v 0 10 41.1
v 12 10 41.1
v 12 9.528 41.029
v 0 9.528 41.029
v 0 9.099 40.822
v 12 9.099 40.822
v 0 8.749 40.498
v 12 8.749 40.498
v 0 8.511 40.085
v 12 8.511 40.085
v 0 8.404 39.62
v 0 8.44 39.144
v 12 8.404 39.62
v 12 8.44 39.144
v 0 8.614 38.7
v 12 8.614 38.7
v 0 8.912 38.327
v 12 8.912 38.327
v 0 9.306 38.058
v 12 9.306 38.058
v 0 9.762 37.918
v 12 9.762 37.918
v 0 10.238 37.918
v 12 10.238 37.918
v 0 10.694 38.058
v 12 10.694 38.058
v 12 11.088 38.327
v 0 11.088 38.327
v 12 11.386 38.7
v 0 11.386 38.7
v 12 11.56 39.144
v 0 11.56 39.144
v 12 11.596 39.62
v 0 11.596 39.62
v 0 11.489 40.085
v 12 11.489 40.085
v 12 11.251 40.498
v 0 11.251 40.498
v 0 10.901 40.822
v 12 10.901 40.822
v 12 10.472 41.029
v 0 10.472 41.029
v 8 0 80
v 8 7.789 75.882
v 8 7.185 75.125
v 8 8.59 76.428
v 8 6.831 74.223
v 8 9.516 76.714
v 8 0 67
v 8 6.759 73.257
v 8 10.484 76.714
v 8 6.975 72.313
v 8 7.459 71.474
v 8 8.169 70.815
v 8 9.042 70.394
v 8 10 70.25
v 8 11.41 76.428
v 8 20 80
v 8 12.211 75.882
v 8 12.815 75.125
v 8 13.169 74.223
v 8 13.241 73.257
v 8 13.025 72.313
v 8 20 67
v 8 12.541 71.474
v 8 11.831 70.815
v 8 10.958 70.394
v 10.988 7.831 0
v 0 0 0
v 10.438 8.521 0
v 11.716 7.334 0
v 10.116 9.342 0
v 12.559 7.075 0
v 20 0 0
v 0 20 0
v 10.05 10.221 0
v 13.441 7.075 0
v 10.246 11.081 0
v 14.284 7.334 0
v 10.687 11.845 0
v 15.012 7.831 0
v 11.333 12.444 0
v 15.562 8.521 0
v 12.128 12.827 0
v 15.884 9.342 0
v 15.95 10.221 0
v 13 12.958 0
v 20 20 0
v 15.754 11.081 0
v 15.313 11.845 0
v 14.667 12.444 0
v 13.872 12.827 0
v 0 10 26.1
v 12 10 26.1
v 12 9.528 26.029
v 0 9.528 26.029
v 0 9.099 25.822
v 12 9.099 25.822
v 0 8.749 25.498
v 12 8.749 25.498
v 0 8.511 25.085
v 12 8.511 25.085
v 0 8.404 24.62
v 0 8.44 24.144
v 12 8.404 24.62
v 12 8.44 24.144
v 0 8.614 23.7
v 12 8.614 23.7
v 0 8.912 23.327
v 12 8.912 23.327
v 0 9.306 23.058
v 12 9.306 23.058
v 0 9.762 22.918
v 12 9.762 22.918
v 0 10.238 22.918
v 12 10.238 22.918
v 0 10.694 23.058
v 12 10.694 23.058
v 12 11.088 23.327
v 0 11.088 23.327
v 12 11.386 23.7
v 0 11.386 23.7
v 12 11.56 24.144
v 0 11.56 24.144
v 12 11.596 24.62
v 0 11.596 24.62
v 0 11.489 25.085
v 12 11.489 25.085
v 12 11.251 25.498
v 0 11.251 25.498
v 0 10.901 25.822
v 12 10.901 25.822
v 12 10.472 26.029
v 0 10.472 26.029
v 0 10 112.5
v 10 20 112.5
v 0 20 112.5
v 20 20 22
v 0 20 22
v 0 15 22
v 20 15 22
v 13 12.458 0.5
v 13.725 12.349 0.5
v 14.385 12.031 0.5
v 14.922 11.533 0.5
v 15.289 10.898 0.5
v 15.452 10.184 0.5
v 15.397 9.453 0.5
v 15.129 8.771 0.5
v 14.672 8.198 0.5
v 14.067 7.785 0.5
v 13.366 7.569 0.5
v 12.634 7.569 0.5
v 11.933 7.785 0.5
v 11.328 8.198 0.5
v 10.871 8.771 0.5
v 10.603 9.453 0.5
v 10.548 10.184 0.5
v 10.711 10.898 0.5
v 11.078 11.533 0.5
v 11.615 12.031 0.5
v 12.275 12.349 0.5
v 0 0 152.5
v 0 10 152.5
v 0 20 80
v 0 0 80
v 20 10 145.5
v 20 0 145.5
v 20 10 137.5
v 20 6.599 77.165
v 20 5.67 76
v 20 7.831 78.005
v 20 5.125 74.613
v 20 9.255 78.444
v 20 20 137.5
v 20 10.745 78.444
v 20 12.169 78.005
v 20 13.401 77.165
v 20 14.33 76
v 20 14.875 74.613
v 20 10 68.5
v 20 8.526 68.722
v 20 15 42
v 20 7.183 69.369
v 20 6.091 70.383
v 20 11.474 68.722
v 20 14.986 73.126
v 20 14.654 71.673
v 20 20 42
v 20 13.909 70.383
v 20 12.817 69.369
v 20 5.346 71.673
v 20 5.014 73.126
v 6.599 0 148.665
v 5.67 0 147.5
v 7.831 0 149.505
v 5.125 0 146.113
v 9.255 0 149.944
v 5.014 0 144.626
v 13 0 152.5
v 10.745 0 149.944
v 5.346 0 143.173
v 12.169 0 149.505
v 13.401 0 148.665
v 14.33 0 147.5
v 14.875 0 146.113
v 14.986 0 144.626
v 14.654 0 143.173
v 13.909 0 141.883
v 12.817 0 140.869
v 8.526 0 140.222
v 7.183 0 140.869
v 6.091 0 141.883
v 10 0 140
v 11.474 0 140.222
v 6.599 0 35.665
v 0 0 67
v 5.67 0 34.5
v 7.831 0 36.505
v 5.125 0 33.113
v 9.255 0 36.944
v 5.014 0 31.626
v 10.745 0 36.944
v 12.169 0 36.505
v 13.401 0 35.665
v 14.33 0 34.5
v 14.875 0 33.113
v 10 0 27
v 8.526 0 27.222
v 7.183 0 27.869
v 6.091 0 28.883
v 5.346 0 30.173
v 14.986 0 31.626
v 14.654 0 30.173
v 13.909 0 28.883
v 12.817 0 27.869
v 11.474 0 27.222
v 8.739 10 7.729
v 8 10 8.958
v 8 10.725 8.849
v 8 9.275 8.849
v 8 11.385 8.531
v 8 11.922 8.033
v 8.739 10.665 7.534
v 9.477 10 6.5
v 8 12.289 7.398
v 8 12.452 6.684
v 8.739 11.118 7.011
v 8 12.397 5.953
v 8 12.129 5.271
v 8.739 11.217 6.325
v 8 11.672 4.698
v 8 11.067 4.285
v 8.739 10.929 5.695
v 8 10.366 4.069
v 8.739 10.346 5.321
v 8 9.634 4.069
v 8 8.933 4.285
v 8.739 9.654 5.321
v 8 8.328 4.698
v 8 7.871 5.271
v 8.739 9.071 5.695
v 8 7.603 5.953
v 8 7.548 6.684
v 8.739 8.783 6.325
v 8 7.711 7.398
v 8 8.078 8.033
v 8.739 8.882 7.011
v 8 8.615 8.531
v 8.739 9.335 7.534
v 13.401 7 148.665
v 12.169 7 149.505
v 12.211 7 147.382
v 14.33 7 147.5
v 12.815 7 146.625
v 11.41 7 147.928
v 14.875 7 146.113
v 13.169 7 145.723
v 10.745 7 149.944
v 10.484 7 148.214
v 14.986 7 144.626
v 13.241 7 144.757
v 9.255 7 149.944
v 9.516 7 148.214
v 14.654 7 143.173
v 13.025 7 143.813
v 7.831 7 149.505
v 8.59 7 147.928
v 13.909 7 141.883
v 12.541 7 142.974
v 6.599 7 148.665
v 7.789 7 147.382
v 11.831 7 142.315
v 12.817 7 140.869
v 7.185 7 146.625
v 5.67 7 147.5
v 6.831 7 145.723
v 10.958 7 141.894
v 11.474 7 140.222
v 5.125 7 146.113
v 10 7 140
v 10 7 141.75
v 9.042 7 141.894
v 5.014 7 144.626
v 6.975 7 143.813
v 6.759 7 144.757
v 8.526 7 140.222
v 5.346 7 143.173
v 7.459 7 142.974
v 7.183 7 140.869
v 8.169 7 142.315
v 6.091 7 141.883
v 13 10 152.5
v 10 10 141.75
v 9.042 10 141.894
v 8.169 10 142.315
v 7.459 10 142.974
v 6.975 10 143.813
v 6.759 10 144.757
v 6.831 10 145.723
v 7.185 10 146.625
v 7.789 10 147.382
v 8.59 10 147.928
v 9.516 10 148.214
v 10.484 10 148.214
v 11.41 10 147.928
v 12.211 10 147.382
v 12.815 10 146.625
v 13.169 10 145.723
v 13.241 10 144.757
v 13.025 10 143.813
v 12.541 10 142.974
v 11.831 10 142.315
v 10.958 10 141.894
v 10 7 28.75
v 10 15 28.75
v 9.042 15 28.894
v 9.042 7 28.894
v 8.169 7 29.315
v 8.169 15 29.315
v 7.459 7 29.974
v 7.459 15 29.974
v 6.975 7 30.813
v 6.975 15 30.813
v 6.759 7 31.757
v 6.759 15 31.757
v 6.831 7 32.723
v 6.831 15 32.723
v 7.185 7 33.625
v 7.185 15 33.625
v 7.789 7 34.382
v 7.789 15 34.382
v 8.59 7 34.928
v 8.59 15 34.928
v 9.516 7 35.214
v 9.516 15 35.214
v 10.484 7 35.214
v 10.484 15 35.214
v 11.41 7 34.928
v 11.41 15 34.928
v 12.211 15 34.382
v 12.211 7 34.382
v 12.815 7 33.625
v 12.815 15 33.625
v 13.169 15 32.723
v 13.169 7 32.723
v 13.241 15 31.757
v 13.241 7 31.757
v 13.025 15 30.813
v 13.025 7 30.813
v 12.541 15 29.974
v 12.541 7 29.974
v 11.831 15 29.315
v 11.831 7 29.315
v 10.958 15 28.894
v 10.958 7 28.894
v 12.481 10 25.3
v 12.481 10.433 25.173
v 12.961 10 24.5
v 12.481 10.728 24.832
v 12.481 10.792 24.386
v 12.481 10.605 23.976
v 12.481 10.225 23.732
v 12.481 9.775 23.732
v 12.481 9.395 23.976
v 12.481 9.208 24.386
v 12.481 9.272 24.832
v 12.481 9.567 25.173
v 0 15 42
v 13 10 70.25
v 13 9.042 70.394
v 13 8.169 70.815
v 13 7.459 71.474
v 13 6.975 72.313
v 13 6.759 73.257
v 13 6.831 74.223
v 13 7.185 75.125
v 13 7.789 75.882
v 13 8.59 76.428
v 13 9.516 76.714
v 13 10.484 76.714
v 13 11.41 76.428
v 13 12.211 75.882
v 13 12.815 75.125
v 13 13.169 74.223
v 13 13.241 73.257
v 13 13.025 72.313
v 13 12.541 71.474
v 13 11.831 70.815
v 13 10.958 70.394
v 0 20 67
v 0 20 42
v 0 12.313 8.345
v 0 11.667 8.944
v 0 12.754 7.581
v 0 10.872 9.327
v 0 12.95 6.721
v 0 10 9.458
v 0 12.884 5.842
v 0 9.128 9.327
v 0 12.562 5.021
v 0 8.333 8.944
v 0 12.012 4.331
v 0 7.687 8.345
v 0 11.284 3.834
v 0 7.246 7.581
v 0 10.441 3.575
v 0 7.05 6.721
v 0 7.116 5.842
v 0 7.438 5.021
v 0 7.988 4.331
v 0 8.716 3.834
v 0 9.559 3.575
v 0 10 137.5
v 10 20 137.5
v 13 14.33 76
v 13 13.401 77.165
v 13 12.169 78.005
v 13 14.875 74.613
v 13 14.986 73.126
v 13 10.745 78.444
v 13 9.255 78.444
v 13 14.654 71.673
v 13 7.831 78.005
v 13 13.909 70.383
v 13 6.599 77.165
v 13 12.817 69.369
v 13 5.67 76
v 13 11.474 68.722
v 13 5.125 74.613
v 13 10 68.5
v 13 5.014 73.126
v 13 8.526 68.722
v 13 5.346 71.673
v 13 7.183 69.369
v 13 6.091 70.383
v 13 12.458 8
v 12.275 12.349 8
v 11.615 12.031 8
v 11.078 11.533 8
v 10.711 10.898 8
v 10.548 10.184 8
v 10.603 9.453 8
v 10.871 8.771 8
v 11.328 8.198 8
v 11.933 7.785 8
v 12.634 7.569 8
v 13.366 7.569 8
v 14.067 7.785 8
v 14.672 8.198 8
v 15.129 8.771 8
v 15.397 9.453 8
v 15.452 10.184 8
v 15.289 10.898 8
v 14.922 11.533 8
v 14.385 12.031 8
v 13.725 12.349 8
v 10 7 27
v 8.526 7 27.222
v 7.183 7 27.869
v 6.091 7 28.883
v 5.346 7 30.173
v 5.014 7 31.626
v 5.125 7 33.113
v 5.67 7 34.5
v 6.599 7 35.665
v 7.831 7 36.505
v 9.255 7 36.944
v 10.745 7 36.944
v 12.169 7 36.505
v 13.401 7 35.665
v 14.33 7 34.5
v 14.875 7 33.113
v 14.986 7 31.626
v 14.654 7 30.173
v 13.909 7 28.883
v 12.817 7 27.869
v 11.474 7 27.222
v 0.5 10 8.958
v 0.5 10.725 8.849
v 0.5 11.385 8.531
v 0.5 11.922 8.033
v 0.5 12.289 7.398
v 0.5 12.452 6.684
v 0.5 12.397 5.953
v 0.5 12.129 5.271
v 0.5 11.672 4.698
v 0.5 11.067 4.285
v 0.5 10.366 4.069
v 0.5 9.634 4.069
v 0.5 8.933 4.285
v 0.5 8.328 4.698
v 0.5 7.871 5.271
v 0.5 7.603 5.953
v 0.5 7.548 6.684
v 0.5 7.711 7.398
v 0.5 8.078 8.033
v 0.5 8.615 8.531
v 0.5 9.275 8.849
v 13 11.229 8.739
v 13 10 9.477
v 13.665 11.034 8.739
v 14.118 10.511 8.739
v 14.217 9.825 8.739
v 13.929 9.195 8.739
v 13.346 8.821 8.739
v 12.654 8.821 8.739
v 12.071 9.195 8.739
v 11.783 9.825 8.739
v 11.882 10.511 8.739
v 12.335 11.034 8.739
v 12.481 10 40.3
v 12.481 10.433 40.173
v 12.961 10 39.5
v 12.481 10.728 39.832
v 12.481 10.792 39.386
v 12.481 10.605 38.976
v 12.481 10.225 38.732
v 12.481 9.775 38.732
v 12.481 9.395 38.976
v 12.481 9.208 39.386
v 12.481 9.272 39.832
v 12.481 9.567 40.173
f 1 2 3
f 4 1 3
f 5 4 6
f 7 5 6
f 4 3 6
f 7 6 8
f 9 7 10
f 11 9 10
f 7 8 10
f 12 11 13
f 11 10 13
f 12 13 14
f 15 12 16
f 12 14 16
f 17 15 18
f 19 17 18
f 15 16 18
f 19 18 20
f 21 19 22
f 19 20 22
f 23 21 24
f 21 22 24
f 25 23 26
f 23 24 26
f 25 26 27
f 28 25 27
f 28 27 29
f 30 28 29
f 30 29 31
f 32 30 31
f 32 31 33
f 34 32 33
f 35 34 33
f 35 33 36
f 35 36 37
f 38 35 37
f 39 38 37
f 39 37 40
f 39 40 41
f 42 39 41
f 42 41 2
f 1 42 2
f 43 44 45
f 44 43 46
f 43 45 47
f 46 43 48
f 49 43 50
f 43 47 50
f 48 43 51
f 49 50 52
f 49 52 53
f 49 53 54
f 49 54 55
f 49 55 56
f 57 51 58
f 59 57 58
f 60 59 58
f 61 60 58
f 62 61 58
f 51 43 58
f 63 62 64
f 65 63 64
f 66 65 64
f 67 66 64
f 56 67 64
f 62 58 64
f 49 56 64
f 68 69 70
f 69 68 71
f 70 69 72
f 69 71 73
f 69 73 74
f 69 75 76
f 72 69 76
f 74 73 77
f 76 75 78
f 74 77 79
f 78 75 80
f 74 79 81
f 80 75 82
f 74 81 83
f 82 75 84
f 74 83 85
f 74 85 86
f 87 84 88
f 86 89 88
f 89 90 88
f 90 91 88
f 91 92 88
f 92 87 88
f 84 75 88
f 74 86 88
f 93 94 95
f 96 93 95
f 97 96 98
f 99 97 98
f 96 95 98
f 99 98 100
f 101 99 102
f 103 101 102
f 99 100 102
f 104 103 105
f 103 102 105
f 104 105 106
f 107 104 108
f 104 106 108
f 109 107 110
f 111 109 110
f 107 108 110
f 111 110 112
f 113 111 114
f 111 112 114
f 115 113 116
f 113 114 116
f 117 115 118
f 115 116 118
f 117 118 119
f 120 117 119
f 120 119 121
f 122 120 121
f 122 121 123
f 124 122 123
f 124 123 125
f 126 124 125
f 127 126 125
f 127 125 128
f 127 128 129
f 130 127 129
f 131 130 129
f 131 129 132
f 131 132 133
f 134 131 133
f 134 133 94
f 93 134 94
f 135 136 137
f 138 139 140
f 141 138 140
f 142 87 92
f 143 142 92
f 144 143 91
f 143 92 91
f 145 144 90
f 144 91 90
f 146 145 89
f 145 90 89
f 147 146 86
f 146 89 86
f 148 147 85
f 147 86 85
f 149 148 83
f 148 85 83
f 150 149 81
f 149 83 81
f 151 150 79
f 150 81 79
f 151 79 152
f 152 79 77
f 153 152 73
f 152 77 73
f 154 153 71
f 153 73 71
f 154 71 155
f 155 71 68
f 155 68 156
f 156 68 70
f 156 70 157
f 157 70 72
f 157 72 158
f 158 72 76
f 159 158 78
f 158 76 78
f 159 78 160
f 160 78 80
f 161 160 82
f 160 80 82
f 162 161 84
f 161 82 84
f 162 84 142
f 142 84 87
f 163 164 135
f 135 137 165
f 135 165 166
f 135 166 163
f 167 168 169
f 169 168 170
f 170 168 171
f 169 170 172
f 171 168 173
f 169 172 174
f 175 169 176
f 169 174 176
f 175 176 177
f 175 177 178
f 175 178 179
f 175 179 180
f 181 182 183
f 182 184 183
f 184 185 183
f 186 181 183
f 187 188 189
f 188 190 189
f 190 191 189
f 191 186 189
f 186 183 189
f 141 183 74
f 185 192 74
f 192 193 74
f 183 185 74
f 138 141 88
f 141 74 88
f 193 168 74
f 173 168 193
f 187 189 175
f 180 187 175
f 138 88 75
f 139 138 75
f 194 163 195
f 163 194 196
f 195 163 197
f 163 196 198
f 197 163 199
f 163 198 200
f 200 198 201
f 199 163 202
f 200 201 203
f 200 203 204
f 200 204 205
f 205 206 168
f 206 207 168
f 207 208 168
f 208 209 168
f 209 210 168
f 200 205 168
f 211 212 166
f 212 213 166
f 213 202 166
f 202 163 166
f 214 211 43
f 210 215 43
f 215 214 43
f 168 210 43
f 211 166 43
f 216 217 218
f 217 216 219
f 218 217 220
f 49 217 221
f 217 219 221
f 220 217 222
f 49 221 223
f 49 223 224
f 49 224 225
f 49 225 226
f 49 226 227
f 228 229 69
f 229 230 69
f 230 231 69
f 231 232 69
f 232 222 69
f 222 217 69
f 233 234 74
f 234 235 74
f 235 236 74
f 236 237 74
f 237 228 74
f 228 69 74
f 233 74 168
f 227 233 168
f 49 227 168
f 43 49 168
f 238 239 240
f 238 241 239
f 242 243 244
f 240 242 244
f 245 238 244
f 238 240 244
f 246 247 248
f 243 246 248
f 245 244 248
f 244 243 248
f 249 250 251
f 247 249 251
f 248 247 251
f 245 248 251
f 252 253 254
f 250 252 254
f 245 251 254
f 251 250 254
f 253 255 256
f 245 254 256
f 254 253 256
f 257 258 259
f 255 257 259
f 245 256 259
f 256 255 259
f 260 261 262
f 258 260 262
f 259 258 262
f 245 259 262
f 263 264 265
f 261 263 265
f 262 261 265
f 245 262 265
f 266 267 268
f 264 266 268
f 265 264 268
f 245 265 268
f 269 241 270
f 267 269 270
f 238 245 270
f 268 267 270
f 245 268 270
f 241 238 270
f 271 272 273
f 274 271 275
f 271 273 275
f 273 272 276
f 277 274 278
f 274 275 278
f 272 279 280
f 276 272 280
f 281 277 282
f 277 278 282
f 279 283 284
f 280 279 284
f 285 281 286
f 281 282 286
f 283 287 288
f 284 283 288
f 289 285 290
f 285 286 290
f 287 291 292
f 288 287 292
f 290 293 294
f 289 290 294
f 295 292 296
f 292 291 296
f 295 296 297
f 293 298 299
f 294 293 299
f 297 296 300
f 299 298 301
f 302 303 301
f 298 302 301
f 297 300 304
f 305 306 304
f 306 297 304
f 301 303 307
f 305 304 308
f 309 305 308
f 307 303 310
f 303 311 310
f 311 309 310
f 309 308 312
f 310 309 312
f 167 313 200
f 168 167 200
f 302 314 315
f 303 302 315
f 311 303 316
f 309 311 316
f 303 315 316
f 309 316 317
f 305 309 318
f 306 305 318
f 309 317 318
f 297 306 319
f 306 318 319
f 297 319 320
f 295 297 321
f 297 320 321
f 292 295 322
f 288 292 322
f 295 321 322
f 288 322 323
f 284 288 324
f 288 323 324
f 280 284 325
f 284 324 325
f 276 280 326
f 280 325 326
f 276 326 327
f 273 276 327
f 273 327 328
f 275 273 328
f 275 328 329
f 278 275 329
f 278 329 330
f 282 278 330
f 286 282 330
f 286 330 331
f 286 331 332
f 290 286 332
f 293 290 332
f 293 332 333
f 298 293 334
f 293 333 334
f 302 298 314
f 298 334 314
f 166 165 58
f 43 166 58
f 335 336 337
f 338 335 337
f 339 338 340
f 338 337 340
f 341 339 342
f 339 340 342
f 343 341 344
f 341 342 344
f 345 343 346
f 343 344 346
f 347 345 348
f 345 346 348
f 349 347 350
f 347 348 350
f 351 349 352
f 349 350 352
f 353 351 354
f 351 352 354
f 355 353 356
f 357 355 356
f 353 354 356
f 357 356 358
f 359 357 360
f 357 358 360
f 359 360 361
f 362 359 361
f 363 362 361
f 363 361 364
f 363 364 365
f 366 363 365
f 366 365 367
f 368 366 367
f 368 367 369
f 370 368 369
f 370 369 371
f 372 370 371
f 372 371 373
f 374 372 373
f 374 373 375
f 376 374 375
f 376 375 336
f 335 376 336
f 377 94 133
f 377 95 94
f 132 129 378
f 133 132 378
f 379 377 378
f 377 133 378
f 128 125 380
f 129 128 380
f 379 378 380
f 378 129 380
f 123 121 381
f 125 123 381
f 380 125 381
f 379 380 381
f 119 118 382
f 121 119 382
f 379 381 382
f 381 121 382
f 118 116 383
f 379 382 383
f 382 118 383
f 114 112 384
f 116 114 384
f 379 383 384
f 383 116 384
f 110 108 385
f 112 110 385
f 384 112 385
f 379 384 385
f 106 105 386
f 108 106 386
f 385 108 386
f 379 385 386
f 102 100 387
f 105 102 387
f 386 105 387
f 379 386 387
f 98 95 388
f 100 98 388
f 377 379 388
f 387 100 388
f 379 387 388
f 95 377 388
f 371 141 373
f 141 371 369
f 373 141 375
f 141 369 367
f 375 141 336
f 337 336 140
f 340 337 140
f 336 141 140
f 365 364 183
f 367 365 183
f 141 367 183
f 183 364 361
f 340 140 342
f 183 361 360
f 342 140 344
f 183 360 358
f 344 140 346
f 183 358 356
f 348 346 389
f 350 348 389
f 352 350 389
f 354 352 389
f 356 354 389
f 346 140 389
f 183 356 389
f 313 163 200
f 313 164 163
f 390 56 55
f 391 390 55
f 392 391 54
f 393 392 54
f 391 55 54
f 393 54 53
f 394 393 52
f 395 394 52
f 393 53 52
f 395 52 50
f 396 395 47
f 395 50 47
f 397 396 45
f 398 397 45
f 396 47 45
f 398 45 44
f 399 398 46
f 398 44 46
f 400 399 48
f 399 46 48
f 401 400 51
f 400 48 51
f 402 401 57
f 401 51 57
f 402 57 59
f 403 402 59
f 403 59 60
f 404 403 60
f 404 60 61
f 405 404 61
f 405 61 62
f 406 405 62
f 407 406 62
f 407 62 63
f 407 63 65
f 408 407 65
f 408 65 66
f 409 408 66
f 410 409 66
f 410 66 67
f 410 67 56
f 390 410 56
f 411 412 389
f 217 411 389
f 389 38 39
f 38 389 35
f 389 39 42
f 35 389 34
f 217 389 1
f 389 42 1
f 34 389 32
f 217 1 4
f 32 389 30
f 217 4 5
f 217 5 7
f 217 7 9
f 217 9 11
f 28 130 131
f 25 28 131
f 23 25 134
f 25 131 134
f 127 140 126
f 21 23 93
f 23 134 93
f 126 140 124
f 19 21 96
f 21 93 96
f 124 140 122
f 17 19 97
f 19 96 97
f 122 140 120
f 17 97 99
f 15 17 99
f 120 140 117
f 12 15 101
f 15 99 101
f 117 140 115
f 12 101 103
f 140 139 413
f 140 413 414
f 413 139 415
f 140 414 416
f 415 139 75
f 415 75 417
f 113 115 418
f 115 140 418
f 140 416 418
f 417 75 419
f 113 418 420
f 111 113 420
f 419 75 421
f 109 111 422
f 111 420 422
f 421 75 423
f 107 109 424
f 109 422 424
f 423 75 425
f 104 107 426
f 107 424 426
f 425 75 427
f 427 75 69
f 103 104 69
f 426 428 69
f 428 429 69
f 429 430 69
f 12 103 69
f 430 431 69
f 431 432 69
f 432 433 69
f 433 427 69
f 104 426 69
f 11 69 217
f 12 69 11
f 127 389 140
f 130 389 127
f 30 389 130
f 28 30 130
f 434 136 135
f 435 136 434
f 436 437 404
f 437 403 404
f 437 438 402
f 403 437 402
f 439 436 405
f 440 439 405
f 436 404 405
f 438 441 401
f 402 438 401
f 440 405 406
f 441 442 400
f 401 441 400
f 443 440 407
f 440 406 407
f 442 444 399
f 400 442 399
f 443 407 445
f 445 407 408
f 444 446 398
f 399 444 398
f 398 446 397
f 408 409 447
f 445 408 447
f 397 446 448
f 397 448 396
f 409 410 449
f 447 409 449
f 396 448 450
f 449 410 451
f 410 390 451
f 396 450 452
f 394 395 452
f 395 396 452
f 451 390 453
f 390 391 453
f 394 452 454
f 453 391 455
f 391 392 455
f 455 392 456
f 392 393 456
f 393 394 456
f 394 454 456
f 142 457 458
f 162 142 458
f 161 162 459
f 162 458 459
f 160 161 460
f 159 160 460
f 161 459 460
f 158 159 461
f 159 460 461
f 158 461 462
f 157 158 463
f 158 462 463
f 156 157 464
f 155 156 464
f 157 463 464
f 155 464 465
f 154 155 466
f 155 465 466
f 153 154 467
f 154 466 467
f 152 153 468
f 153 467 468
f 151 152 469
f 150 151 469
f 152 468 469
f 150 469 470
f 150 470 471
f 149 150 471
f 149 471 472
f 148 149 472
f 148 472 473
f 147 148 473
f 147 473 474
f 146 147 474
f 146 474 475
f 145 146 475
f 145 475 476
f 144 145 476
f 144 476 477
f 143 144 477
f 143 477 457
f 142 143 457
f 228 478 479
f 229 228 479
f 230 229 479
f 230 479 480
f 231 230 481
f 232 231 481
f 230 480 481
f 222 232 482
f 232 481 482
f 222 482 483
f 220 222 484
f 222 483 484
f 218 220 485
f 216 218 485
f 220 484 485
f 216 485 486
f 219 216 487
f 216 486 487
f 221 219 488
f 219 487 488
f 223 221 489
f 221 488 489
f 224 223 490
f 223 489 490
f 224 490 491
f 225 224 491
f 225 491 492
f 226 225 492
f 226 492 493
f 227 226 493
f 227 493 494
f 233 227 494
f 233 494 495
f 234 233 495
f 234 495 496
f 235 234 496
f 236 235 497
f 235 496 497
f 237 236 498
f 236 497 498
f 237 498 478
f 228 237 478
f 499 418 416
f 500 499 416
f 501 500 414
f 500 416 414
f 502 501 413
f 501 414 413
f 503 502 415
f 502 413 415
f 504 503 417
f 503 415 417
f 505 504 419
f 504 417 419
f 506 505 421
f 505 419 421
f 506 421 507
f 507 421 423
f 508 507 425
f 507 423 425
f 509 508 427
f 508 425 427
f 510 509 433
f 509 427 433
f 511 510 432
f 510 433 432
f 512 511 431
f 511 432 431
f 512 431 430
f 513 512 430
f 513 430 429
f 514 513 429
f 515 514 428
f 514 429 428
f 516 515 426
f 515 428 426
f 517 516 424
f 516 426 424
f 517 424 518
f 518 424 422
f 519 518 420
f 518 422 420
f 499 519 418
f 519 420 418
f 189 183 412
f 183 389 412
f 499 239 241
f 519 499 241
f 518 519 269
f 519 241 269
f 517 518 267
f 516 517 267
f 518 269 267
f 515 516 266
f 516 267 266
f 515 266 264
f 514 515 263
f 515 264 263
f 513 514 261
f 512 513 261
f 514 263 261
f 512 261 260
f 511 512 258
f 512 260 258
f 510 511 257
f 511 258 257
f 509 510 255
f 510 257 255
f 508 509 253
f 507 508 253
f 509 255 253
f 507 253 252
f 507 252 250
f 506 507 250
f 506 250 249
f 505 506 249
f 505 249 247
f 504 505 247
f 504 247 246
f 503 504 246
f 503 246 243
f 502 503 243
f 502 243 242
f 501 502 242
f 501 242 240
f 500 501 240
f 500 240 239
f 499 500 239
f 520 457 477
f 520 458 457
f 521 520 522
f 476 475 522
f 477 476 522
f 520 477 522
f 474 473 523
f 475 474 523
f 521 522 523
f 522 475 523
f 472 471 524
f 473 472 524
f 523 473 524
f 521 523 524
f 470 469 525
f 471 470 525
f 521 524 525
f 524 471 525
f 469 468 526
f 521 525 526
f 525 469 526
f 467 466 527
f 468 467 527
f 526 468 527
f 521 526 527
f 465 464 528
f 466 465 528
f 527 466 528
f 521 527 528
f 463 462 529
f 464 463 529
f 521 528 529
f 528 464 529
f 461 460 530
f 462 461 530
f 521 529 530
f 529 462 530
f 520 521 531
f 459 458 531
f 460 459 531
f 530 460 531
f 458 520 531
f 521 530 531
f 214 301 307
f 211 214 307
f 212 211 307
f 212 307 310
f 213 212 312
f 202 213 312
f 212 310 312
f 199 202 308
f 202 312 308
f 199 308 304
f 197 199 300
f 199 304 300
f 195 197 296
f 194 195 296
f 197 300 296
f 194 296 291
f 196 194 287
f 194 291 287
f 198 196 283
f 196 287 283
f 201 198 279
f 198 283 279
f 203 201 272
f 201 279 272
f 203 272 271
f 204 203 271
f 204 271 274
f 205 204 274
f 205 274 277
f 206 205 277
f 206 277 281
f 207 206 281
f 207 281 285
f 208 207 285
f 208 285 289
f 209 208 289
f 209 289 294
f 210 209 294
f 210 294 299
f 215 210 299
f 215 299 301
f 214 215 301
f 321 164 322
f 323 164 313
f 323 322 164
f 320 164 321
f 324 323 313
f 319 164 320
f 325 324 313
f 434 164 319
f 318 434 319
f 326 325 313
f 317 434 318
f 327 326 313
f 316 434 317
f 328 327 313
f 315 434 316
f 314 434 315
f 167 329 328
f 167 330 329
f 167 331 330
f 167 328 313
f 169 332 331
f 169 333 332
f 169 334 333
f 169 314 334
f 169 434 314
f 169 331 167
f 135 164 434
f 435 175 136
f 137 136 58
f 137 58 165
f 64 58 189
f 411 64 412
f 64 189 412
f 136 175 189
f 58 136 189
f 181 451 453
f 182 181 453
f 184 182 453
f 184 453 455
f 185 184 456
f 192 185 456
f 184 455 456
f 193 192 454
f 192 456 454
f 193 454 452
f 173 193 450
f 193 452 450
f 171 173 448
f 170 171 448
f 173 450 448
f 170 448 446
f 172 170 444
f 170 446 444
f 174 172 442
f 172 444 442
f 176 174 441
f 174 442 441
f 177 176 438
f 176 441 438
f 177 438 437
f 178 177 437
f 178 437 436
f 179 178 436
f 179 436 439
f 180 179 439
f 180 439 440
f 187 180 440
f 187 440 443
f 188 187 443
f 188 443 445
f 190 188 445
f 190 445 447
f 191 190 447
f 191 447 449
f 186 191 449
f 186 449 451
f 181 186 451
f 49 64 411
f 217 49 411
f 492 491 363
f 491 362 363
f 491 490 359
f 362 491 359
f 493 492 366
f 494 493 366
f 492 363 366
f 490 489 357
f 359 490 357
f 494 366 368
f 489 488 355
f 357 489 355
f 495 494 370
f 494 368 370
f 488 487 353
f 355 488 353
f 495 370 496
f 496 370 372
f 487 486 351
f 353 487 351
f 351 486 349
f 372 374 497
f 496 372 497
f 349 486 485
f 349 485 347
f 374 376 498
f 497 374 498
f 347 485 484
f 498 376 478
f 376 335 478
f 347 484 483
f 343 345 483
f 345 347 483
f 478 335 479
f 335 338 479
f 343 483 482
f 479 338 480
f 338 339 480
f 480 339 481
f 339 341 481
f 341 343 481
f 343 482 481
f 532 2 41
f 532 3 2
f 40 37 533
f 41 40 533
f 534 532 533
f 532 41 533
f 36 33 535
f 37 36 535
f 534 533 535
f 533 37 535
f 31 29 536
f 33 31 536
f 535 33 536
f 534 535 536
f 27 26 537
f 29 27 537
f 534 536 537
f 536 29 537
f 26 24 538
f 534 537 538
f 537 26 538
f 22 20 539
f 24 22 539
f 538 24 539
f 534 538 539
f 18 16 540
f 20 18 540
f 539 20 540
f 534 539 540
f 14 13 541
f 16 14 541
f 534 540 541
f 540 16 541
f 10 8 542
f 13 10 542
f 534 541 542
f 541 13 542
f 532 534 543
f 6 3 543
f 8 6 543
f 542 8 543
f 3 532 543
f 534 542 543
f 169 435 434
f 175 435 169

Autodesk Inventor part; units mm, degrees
ref_plane "YZ Plane" through (0, 0, 0) normal (1, 0, 0) x (0, 1, 0)
ref_plane "XZ Plane" through (0, 0, 0) normal (0, 1, 0) x (-1, 0, 0)
ref_plane "XY Plane" through (0, 0, 0) normal (0, 0, 1) x (1, 0, 0)
sketch "Sketch1" plane through (0, 0, 0) normal (0, 0, 1) x (1, 0, 0)
  line L0 (0, 0) -> (20, 0)
  line L1 (20, 0) -> (20, 20)
  line L2 (20, 20) -> (0, 20)
  line L3 (0, 20) -> (0, 0)
  dimension "d0" = 20
  dimension "d1" = 20
extrude "Extrusion1" add sketch "Sketch1" along normal blind 152.5
sketch "Sketch2" plane through (0, 20, 0) normal (0, 1, 0) x (1, 0, 0)
  line L0 (0, -152.5) -> (20, -152.5) projected
  line L1 (0, 0) -> (0, -152.5) projected
  line L2 (0, -80) -> (8, -80)
  line L3 (8, -80) -> (8, -67)
  line L4 (8, -67) -> (0, -67)
  line L5 (0, -67) -> (0, -80)
  dimension "d4" = 13
  dimension "d5" = 72.5
  dimension "d6" = 8
extrude "Extrusion2" cut sketch "Sketch2" against normal blind 20
sketch "Sketch3" plane through (0, 20, 0) normal (0, 1, 0) x (1, 0, 0)
  line L0 (0, -80) -> (0, -152.5) projected
  line L1 (0, -152.5) -> (20, -152.5) projected
  line L2 (20, 0) -> (20, -152.5) projected
  line L3 (0, -137.5) -> (20, -137.5)
  dimension "d9" = 15
extrude "Extrusion3" cut sketch "Sketch3" against normal blind 10
chamfer "Chamfer1" distance 7 angle 45 1 edges at (20, 5, 152.5)
sketch "Sketch4" plane through (0, 20, 0) normal (0, 1, 0) x (1, 0, 0)
  line L0 (0, -137.5) -> (10, -137.5)
  line L1 (10, -137.5) -> (10, -112.5)
  line L2 (10, -112.5) -> (0, -112.5)
  line L3 (0, -112.5) -> (0, -137.5)
  dimension "d15" = 10
  dimension "d16" = 25
extrude "Extrusion4" cut sketch "Sketch4" against normal blind 10
chamfer "Chamfer2" distance 10 angle 45 1 edges at (10, 10, 125)
sketch "Sketch5" plane through (0, 0, 0) normal (0, -1, 0) x (1, 0, 0)
  line L0 (0, 80) -> (0, 152.5) projected
  line L1 (20, 137.5) -> (0, 137.5) projected
  point P0 (10, 145)
  dimension "d22" = 10
  dimension "d23" = 7.5
hole "Hole1" at (10, 0, 145) direction (0, 1, 0) diameter 6.5 depth 10 tip angle 118 counterbore diameter 10 counterbore depth 7
sketch "Sketch6" plane through (20, 0, 0) normal (1, 0, 0) x (0, 0, -1)
  line L0 (0, 0) -> (-145.5, 0) projected
  line L1 (-80, 20) -> (-80, 0) projected
  line L2 (-67, 20) -> (-67, 0) projected
  line L3 (-152.5, 10) -> (-152.5, 0) projected
  point P0 (-73.5, 10)
  dimension "d31" = 79
  dimension "d32" = 10
hole "Hole2" at (20, 10, 73.5) direction (-1, 0, 0) diameter 6.5 depth 13 tip angle 118 counterbore diameter 10 counterbore depth 7
sketch "Sketch7" plane through (0, 0, 0) normal (-1, 0, 0) x (0, 0, 1)
  line L0 (0, 20) -> (67, 20) projected
  line L1 (0, 20) -> (0, 0) projected
  line L2 (42, 20) -> (22, 20)
  line L3 (22, 20) -> (22, 15)
  line L4 (22, 15) -> (42, 15)
  line L5 (42, 15) -> (42, 20)
  dimension "d40" = 20
  dimension "d41" = 22
  dimension "d42" = 5
extrude "Extrusion5" cut sketch "Sketch7" against normal blind 20
sketch "Sketch8" plane through (0, 0, 0) normal (0, -1, 0) x (1, 0, 0)
  line L0 (20, 0) -> (20, 145.5) projected
  line L1 (0, 22) -> (20, 22) projected
  line L2 (0, 42) -> (20, 42) projected
  point P0 (10, 32)
  dimension "d45" = 10
  dimension "d46" = 10
hole "Hole3" at (10, 0, 32) direction (0, 1, 0) diameter 6.5 depth 15 tip angle 118 counterbore diameter 10 counterbore depth 7
sketch "Sketch9" plane through (0, 0, 0) normal (-1, 0, 0) x (0, 0, 1)
  line L0 (0, 0) -> (67, 0) projected
  line L1 (42, 15) -> (22, 15) projected
  line L2 (27, 7) -> (27, 0) projected
  line L3 (27, 7) -> (37, 7) projected
  line L4 (37, 7) -> (37, 0) projected
  line L5 (35.25, 15) -> (35.25, 7) projected
  line L6 (28.75, 15) -> (28.75, 7) projected
  line L7 (32, 15) -> (32, 0)
  point P0 (39.5, 10)
  point P1 (24.5, 10)
  dimension "d54" = 15
  dimension "d56" = 7.5
  dimension "d57" = 10
hole "Hole4" at (0, 10, 39.5) at (0, 10, 24.5) direction (1, 0, 0) diameter 3.2 depth 12 tip angle 118
sketch "Sketch10" plane through (0, 0, 0) normal (0, 0, -1) x (-1, 0, 0)
  line L0 (-20, 20) -> (0, 20) projected
  line L1 (-20, 0) -> (-20, 20) projected
  point P0 (-13, 10)
  dimension "d65" = 7
  dimension "d66" = 10
hole "Hole5" at (13, 10, 0) direction (0, 0, 1) diameter 4.917 depth 8 tip angle 118 thread size "M6x1" class "6H" standard "ANSI Metric M Profile"
chamfer "Chamfer3" distance 0.5 angle 45 1 edges at (13, 7.5415, 0)
sketch "Sketch11" plane through (0, 0, 0) normal (-1, 0, 0) x (0, 0, 1)
  line L0 (0, 20) -> (22, 20) projected
  line L1 (0, 20) -> (0, 0) projected
  point P0 (6.5, 10)
  dimension "d77" = 10
  dimension "d78" = 6.5
hole "Hole6" at (0, 10, 6.5) direction (1, 0, 0) diameter 4.917 depth 8 tip angle 118 thread size "M6x1" class "6H" standard "ANSI Metric M Profile"
chamfer "Chamfer4" distance 0.5 angle 45 1 edges at (0, 10, 4.0415)
properties part number "CHASSI ESQUERDO(37)" material "Carbon Steel"
